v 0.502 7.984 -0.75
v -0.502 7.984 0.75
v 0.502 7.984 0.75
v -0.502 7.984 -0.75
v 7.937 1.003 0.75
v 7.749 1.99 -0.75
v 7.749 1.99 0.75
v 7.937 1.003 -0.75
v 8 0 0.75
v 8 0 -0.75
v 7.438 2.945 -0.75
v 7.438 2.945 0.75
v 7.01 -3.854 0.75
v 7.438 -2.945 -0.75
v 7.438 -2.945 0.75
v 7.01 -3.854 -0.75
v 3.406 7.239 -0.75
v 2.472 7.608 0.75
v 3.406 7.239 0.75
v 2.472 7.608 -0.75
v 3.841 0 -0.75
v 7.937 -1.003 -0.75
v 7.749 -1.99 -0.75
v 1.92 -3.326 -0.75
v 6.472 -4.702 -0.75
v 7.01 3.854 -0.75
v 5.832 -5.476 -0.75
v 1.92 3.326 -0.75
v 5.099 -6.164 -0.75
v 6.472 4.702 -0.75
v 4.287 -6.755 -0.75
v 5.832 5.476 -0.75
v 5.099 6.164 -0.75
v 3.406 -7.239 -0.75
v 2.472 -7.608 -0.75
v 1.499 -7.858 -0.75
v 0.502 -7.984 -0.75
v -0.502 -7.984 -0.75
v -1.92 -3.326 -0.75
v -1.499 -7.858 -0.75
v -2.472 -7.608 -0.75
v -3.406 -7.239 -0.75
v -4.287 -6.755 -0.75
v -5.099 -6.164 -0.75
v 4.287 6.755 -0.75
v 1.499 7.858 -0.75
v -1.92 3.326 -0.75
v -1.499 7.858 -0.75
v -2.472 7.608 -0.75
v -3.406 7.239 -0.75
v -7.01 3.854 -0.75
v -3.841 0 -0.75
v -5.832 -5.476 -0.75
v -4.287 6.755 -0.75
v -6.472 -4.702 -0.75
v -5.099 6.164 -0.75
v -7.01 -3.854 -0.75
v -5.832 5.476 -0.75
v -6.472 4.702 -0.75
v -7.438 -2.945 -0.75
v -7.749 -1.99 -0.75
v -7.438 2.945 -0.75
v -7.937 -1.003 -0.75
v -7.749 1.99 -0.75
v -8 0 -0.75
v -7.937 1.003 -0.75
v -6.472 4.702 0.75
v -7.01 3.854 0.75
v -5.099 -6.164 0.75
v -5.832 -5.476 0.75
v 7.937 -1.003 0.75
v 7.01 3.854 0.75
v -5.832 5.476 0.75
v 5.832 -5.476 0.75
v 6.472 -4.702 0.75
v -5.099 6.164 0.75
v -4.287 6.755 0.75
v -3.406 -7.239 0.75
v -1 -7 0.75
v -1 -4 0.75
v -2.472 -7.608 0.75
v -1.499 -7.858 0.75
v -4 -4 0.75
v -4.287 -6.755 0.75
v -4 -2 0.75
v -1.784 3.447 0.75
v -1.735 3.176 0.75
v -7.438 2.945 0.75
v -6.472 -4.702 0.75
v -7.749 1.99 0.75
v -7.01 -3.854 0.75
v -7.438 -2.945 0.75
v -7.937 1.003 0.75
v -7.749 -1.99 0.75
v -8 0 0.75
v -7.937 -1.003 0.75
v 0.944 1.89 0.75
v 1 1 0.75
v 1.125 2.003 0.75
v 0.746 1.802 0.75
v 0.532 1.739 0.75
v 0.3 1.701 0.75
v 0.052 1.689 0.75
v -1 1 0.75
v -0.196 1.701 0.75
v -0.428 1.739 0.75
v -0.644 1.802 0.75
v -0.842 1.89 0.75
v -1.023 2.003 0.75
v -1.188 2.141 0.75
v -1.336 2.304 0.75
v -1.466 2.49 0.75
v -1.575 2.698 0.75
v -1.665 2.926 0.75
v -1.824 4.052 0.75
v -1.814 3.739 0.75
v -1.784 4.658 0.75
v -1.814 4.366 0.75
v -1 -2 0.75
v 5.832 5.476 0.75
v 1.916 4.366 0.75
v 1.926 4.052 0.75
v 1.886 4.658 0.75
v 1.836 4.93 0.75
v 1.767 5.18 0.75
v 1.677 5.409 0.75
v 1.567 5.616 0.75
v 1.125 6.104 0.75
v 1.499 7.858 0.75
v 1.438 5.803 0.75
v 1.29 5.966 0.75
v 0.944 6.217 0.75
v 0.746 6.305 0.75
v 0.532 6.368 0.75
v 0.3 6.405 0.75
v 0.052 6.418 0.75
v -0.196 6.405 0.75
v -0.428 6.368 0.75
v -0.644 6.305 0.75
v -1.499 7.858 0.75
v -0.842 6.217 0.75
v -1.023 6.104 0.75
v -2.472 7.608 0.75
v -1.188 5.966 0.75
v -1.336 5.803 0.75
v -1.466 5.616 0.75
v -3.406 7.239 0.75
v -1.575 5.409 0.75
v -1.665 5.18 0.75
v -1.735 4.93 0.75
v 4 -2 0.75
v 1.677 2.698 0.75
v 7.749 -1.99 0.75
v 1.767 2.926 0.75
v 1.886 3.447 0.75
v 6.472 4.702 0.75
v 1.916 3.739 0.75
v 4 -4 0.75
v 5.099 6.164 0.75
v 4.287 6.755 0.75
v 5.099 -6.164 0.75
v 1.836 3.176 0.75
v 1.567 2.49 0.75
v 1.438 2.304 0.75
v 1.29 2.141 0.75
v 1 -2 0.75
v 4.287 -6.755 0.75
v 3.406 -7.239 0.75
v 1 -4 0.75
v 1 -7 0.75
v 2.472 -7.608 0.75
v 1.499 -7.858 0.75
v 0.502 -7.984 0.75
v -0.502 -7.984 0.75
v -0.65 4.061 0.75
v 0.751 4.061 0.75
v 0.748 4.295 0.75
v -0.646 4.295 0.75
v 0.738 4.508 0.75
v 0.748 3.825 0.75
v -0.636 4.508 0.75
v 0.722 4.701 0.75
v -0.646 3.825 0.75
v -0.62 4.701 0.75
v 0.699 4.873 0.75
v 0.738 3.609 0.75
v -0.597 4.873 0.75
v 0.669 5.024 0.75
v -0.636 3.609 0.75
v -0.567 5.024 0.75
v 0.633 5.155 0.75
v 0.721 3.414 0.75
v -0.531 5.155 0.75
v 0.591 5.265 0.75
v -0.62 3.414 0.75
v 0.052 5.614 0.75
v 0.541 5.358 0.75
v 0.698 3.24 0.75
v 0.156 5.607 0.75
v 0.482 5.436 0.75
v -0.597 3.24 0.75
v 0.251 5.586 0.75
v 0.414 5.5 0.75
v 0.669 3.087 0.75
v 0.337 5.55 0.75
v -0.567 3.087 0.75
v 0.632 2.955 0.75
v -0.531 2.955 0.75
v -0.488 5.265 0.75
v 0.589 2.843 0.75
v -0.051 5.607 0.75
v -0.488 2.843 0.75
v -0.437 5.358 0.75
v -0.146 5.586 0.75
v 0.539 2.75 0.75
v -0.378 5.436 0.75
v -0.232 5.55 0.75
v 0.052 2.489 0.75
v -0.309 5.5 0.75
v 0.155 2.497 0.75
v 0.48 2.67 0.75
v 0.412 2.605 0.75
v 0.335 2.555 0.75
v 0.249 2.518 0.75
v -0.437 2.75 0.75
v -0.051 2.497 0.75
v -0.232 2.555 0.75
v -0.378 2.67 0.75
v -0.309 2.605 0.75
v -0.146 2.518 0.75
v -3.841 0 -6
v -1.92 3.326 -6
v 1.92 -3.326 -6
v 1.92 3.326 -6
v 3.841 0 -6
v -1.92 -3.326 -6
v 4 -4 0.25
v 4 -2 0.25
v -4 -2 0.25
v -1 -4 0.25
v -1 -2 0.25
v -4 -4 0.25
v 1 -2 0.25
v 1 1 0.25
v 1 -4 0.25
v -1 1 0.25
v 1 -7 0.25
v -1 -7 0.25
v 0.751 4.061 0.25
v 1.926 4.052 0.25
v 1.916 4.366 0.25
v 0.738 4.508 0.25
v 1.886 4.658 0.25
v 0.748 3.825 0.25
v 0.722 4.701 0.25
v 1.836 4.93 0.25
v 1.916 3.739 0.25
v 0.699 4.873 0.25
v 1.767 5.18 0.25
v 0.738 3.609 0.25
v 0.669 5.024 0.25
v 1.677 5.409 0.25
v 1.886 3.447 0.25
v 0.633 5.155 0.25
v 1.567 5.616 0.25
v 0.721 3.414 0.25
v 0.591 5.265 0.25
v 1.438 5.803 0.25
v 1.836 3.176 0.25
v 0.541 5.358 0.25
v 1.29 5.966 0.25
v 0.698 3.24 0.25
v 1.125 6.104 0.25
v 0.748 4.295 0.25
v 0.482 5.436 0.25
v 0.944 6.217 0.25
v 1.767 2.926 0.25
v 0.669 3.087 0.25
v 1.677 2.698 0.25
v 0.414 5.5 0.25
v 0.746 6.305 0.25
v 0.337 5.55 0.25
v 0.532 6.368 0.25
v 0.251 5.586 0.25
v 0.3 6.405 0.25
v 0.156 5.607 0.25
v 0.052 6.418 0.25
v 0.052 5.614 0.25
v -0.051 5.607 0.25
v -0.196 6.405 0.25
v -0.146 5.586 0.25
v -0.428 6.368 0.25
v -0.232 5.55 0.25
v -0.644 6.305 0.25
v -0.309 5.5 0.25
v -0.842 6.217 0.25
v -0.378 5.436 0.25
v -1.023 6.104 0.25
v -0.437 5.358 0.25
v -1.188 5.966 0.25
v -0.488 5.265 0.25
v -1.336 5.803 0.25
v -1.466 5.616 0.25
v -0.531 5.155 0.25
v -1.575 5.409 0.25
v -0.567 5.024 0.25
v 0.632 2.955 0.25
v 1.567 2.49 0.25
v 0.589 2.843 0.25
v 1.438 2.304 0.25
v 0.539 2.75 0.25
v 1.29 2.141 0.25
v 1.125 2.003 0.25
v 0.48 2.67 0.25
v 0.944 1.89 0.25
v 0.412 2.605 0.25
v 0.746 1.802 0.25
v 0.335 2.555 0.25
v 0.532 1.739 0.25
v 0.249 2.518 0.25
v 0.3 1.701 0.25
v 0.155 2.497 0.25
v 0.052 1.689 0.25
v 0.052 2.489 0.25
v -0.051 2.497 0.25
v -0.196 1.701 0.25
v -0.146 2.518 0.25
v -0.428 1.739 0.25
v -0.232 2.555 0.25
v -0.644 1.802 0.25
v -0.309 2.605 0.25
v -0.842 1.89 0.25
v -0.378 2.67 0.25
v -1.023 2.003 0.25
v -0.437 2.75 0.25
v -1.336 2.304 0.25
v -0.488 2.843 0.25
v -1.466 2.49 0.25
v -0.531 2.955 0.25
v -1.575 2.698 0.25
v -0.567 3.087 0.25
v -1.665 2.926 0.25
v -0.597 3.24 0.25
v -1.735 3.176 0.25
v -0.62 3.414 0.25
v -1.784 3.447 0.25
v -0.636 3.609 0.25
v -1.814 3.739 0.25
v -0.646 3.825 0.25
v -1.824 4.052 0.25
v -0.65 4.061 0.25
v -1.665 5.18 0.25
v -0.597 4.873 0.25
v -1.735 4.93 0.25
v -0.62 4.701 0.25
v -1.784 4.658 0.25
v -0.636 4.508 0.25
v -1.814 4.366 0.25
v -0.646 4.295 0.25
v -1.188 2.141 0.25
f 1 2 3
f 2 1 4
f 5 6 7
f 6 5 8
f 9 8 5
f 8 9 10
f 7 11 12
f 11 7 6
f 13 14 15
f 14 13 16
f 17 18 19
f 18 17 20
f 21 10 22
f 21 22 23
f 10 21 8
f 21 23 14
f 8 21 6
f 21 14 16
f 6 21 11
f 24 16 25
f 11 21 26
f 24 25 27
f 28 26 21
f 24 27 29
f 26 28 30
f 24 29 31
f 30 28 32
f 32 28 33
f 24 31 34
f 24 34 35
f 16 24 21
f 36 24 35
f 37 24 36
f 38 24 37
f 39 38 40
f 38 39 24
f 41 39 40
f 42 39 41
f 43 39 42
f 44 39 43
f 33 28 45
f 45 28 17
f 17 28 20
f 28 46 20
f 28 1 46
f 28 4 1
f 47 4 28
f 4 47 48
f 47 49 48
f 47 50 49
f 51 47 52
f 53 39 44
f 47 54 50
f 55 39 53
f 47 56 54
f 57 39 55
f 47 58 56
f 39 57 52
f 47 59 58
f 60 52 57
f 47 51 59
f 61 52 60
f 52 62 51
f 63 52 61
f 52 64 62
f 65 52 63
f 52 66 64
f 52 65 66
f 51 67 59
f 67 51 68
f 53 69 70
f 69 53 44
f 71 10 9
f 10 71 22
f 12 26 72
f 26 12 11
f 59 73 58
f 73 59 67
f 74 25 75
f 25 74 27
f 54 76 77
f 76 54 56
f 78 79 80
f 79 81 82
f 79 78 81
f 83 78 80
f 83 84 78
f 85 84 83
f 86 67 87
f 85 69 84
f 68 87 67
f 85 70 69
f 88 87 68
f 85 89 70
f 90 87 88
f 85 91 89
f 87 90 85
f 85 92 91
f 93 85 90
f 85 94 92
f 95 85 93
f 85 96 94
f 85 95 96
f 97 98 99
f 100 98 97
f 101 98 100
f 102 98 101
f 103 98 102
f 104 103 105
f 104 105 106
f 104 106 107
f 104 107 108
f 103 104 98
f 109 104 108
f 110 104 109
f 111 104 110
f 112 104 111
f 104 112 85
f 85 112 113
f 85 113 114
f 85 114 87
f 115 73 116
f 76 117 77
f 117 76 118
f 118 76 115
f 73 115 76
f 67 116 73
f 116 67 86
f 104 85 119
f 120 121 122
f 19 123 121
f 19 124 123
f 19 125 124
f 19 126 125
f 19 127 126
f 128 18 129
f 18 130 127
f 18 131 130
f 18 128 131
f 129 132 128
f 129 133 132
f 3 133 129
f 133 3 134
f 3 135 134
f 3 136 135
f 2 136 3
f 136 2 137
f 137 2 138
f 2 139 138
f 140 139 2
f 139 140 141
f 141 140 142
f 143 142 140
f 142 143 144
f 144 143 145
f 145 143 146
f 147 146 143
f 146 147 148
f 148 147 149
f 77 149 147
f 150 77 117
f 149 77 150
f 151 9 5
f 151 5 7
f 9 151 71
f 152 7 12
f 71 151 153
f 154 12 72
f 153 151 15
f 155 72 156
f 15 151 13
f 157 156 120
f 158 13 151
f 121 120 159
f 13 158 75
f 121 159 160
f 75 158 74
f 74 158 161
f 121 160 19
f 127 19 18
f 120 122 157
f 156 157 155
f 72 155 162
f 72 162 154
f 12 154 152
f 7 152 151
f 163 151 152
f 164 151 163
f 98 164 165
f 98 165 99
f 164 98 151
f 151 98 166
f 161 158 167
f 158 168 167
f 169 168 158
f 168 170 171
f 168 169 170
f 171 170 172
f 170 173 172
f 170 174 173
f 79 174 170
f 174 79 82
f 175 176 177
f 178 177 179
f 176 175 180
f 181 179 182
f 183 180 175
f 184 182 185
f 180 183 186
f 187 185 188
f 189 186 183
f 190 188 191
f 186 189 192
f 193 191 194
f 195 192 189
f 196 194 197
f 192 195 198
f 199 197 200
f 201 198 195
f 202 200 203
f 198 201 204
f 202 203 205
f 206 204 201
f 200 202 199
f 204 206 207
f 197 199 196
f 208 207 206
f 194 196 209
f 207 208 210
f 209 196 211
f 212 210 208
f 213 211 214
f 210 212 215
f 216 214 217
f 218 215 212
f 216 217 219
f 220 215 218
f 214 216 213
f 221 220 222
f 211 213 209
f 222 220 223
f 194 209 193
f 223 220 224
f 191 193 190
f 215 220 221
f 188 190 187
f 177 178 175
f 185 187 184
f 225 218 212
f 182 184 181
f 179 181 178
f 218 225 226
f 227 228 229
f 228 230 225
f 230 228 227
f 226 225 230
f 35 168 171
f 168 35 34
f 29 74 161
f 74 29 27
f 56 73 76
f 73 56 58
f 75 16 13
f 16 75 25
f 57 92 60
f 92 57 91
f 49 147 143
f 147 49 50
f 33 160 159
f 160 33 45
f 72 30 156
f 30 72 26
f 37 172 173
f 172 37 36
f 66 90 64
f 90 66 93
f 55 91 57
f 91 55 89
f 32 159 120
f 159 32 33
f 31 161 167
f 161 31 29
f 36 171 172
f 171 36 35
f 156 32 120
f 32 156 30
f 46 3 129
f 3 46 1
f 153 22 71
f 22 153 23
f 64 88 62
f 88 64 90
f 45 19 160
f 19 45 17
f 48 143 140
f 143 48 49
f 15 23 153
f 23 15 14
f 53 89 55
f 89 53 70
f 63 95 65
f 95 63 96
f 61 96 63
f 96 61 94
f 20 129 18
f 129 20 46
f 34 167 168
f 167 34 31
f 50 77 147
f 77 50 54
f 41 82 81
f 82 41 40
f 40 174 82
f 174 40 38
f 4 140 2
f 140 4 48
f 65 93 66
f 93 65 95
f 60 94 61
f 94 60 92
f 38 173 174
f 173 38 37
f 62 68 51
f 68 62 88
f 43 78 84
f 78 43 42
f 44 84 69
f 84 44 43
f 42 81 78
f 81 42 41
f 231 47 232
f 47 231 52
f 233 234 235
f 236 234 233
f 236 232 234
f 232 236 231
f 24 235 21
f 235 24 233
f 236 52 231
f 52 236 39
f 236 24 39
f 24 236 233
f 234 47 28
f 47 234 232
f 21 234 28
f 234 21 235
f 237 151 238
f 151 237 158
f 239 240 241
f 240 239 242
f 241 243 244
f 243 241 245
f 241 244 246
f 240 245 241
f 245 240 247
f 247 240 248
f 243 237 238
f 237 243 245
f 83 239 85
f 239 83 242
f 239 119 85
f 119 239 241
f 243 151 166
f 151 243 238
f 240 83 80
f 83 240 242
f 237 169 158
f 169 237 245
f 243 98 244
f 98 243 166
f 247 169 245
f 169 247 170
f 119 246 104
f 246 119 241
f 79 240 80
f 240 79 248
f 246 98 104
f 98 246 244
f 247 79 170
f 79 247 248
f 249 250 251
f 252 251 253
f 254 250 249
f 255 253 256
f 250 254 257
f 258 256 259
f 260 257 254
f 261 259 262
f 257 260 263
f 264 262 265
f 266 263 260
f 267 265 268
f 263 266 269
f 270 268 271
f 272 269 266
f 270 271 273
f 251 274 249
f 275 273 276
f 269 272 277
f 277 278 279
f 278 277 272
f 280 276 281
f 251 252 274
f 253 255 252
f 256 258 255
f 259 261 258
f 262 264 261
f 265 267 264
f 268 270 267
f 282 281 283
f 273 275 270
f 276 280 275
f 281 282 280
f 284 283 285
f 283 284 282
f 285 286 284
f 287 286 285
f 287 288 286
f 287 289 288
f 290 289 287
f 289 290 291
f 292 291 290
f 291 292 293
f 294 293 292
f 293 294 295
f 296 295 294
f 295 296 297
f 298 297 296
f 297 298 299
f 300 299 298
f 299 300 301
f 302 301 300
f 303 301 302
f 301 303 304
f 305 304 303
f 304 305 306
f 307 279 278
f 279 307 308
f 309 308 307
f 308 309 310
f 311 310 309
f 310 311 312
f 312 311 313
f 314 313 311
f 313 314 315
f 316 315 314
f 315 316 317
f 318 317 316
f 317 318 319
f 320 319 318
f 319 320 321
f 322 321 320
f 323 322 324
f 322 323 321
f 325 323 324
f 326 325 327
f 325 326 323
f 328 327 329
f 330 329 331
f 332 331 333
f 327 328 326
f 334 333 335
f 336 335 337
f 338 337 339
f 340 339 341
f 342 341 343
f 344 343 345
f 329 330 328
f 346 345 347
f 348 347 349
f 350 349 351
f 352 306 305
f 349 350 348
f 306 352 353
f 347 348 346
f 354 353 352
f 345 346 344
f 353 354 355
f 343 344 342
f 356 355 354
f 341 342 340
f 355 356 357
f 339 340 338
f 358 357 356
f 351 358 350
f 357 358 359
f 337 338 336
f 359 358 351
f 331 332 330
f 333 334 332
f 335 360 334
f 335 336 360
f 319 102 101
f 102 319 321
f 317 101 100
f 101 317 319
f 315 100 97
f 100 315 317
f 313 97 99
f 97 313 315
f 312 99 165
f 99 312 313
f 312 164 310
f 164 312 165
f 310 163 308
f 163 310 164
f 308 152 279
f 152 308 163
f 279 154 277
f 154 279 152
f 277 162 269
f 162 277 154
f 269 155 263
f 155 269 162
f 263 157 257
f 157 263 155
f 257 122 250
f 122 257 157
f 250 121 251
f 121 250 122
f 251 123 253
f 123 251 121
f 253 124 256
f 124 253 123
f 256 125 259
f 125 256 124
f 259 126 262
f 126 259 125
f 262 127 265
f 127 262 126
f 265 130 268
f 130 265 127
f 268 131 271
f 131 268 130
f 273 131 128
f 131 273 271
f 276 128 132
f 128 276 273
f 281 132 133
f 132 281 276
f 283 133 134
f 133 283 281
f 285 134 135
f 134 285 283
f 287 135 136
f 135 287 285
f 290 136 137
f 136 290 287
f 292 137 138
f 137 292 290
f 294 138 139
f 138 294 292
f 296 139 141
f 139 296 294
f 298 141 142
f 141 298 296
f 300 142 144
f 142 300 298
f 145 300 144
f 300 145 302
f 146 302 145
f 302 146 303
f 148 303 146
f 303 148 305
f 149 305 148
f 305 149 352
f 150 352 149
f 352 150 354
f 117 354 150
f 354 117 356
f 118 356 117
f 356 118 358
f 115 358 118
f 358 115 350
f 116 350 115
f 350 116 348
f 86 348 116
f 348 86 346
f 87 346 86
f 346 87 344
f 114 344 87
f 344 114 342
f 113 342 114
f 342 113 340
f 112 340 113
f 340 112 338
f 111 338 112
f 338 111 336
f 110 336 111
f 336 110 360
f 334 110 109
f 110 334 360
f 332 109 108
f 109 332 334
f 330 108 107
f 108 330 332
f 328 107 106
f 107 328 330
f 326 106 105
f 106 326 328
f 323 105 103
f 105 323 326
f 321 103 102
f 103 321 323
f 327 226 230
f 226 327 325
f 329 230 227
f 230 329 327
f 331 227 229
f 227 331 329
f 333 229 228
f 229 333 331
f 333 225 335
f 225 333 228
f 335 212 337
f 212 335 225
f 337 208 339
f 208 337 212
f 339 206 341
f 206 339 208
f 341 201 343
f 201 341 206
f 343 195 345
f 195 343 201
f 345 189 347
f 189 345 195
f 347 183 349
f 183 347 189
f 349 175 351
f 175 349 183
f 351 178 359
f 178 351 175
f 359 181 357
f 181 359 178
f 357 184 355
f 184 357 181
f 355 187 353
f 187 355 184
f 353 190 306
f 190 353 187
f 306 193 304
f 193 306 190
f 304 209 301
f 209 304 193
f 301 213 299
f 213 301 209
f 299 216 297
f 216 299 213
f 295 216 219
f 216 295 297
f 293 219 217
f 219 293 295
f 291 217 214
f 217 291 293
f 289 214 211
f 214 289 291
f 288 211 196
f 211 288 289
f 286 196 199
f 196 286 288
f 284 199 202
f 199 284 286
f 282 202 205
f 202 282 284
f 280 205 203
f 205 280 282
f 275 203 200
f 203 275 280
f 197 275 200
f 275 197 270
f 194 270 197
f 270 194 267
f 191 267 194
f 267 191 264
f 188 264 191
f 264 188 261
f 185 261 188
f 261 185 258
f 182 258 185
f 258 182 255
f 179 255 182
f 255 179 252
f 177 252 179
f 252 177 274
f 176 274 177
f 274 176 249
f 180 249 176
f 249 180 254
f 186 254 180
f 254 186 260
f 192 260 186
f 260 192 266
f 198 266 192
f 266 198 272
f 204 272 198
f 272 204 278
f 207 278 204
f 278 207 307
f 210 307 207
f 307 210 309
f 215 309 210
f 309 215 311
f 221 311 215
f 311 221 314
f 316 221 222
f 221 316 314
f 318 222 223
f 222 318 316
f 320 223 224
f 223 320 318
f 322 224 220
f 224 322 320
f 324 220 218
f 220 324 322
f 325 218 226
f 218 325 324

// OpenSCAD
$fn = 50;


difference() {
	union() {
		translate(v = [0, 0, -0.7500000000]) {
			cylinder(h = 1.5000000000, r = 8.0000000000);
		}
		translate(v = [0, 0, -6]) {
			linear_extrude(height = 6) {
				polygon(points = [[3.8408550000, 0.0000000000], [1.9204275000, 3.3262780023], [-1.9204275000, 3.3262780023], [-3.8408550000, 0.0000000000], [-1.9204275000, -3.3262780023], [1.9204275000, -3.3262780023]]);
			}
		}
	}
	union() {
		#translate(v = [-4.0000000000, -4.0000000000, 0.2500000000]) {
			cube(size = [8, 2, 0.5000000000]);
		}
		#translate(v = [-1.0000000000, -7.0000000000, 0.2500000000]) {
			cube(size = [2, 8, 0.5000000000]);
		}
		#translate(v = [0, 4, 0.2500000000]) {
			linear_extrude(height = 0.5000000000) {
				text(font = "SegoiUI:Bold", halign = "center", size = 4.5000000000, text = "0", valign = "center");
			}
		}
	}
}
